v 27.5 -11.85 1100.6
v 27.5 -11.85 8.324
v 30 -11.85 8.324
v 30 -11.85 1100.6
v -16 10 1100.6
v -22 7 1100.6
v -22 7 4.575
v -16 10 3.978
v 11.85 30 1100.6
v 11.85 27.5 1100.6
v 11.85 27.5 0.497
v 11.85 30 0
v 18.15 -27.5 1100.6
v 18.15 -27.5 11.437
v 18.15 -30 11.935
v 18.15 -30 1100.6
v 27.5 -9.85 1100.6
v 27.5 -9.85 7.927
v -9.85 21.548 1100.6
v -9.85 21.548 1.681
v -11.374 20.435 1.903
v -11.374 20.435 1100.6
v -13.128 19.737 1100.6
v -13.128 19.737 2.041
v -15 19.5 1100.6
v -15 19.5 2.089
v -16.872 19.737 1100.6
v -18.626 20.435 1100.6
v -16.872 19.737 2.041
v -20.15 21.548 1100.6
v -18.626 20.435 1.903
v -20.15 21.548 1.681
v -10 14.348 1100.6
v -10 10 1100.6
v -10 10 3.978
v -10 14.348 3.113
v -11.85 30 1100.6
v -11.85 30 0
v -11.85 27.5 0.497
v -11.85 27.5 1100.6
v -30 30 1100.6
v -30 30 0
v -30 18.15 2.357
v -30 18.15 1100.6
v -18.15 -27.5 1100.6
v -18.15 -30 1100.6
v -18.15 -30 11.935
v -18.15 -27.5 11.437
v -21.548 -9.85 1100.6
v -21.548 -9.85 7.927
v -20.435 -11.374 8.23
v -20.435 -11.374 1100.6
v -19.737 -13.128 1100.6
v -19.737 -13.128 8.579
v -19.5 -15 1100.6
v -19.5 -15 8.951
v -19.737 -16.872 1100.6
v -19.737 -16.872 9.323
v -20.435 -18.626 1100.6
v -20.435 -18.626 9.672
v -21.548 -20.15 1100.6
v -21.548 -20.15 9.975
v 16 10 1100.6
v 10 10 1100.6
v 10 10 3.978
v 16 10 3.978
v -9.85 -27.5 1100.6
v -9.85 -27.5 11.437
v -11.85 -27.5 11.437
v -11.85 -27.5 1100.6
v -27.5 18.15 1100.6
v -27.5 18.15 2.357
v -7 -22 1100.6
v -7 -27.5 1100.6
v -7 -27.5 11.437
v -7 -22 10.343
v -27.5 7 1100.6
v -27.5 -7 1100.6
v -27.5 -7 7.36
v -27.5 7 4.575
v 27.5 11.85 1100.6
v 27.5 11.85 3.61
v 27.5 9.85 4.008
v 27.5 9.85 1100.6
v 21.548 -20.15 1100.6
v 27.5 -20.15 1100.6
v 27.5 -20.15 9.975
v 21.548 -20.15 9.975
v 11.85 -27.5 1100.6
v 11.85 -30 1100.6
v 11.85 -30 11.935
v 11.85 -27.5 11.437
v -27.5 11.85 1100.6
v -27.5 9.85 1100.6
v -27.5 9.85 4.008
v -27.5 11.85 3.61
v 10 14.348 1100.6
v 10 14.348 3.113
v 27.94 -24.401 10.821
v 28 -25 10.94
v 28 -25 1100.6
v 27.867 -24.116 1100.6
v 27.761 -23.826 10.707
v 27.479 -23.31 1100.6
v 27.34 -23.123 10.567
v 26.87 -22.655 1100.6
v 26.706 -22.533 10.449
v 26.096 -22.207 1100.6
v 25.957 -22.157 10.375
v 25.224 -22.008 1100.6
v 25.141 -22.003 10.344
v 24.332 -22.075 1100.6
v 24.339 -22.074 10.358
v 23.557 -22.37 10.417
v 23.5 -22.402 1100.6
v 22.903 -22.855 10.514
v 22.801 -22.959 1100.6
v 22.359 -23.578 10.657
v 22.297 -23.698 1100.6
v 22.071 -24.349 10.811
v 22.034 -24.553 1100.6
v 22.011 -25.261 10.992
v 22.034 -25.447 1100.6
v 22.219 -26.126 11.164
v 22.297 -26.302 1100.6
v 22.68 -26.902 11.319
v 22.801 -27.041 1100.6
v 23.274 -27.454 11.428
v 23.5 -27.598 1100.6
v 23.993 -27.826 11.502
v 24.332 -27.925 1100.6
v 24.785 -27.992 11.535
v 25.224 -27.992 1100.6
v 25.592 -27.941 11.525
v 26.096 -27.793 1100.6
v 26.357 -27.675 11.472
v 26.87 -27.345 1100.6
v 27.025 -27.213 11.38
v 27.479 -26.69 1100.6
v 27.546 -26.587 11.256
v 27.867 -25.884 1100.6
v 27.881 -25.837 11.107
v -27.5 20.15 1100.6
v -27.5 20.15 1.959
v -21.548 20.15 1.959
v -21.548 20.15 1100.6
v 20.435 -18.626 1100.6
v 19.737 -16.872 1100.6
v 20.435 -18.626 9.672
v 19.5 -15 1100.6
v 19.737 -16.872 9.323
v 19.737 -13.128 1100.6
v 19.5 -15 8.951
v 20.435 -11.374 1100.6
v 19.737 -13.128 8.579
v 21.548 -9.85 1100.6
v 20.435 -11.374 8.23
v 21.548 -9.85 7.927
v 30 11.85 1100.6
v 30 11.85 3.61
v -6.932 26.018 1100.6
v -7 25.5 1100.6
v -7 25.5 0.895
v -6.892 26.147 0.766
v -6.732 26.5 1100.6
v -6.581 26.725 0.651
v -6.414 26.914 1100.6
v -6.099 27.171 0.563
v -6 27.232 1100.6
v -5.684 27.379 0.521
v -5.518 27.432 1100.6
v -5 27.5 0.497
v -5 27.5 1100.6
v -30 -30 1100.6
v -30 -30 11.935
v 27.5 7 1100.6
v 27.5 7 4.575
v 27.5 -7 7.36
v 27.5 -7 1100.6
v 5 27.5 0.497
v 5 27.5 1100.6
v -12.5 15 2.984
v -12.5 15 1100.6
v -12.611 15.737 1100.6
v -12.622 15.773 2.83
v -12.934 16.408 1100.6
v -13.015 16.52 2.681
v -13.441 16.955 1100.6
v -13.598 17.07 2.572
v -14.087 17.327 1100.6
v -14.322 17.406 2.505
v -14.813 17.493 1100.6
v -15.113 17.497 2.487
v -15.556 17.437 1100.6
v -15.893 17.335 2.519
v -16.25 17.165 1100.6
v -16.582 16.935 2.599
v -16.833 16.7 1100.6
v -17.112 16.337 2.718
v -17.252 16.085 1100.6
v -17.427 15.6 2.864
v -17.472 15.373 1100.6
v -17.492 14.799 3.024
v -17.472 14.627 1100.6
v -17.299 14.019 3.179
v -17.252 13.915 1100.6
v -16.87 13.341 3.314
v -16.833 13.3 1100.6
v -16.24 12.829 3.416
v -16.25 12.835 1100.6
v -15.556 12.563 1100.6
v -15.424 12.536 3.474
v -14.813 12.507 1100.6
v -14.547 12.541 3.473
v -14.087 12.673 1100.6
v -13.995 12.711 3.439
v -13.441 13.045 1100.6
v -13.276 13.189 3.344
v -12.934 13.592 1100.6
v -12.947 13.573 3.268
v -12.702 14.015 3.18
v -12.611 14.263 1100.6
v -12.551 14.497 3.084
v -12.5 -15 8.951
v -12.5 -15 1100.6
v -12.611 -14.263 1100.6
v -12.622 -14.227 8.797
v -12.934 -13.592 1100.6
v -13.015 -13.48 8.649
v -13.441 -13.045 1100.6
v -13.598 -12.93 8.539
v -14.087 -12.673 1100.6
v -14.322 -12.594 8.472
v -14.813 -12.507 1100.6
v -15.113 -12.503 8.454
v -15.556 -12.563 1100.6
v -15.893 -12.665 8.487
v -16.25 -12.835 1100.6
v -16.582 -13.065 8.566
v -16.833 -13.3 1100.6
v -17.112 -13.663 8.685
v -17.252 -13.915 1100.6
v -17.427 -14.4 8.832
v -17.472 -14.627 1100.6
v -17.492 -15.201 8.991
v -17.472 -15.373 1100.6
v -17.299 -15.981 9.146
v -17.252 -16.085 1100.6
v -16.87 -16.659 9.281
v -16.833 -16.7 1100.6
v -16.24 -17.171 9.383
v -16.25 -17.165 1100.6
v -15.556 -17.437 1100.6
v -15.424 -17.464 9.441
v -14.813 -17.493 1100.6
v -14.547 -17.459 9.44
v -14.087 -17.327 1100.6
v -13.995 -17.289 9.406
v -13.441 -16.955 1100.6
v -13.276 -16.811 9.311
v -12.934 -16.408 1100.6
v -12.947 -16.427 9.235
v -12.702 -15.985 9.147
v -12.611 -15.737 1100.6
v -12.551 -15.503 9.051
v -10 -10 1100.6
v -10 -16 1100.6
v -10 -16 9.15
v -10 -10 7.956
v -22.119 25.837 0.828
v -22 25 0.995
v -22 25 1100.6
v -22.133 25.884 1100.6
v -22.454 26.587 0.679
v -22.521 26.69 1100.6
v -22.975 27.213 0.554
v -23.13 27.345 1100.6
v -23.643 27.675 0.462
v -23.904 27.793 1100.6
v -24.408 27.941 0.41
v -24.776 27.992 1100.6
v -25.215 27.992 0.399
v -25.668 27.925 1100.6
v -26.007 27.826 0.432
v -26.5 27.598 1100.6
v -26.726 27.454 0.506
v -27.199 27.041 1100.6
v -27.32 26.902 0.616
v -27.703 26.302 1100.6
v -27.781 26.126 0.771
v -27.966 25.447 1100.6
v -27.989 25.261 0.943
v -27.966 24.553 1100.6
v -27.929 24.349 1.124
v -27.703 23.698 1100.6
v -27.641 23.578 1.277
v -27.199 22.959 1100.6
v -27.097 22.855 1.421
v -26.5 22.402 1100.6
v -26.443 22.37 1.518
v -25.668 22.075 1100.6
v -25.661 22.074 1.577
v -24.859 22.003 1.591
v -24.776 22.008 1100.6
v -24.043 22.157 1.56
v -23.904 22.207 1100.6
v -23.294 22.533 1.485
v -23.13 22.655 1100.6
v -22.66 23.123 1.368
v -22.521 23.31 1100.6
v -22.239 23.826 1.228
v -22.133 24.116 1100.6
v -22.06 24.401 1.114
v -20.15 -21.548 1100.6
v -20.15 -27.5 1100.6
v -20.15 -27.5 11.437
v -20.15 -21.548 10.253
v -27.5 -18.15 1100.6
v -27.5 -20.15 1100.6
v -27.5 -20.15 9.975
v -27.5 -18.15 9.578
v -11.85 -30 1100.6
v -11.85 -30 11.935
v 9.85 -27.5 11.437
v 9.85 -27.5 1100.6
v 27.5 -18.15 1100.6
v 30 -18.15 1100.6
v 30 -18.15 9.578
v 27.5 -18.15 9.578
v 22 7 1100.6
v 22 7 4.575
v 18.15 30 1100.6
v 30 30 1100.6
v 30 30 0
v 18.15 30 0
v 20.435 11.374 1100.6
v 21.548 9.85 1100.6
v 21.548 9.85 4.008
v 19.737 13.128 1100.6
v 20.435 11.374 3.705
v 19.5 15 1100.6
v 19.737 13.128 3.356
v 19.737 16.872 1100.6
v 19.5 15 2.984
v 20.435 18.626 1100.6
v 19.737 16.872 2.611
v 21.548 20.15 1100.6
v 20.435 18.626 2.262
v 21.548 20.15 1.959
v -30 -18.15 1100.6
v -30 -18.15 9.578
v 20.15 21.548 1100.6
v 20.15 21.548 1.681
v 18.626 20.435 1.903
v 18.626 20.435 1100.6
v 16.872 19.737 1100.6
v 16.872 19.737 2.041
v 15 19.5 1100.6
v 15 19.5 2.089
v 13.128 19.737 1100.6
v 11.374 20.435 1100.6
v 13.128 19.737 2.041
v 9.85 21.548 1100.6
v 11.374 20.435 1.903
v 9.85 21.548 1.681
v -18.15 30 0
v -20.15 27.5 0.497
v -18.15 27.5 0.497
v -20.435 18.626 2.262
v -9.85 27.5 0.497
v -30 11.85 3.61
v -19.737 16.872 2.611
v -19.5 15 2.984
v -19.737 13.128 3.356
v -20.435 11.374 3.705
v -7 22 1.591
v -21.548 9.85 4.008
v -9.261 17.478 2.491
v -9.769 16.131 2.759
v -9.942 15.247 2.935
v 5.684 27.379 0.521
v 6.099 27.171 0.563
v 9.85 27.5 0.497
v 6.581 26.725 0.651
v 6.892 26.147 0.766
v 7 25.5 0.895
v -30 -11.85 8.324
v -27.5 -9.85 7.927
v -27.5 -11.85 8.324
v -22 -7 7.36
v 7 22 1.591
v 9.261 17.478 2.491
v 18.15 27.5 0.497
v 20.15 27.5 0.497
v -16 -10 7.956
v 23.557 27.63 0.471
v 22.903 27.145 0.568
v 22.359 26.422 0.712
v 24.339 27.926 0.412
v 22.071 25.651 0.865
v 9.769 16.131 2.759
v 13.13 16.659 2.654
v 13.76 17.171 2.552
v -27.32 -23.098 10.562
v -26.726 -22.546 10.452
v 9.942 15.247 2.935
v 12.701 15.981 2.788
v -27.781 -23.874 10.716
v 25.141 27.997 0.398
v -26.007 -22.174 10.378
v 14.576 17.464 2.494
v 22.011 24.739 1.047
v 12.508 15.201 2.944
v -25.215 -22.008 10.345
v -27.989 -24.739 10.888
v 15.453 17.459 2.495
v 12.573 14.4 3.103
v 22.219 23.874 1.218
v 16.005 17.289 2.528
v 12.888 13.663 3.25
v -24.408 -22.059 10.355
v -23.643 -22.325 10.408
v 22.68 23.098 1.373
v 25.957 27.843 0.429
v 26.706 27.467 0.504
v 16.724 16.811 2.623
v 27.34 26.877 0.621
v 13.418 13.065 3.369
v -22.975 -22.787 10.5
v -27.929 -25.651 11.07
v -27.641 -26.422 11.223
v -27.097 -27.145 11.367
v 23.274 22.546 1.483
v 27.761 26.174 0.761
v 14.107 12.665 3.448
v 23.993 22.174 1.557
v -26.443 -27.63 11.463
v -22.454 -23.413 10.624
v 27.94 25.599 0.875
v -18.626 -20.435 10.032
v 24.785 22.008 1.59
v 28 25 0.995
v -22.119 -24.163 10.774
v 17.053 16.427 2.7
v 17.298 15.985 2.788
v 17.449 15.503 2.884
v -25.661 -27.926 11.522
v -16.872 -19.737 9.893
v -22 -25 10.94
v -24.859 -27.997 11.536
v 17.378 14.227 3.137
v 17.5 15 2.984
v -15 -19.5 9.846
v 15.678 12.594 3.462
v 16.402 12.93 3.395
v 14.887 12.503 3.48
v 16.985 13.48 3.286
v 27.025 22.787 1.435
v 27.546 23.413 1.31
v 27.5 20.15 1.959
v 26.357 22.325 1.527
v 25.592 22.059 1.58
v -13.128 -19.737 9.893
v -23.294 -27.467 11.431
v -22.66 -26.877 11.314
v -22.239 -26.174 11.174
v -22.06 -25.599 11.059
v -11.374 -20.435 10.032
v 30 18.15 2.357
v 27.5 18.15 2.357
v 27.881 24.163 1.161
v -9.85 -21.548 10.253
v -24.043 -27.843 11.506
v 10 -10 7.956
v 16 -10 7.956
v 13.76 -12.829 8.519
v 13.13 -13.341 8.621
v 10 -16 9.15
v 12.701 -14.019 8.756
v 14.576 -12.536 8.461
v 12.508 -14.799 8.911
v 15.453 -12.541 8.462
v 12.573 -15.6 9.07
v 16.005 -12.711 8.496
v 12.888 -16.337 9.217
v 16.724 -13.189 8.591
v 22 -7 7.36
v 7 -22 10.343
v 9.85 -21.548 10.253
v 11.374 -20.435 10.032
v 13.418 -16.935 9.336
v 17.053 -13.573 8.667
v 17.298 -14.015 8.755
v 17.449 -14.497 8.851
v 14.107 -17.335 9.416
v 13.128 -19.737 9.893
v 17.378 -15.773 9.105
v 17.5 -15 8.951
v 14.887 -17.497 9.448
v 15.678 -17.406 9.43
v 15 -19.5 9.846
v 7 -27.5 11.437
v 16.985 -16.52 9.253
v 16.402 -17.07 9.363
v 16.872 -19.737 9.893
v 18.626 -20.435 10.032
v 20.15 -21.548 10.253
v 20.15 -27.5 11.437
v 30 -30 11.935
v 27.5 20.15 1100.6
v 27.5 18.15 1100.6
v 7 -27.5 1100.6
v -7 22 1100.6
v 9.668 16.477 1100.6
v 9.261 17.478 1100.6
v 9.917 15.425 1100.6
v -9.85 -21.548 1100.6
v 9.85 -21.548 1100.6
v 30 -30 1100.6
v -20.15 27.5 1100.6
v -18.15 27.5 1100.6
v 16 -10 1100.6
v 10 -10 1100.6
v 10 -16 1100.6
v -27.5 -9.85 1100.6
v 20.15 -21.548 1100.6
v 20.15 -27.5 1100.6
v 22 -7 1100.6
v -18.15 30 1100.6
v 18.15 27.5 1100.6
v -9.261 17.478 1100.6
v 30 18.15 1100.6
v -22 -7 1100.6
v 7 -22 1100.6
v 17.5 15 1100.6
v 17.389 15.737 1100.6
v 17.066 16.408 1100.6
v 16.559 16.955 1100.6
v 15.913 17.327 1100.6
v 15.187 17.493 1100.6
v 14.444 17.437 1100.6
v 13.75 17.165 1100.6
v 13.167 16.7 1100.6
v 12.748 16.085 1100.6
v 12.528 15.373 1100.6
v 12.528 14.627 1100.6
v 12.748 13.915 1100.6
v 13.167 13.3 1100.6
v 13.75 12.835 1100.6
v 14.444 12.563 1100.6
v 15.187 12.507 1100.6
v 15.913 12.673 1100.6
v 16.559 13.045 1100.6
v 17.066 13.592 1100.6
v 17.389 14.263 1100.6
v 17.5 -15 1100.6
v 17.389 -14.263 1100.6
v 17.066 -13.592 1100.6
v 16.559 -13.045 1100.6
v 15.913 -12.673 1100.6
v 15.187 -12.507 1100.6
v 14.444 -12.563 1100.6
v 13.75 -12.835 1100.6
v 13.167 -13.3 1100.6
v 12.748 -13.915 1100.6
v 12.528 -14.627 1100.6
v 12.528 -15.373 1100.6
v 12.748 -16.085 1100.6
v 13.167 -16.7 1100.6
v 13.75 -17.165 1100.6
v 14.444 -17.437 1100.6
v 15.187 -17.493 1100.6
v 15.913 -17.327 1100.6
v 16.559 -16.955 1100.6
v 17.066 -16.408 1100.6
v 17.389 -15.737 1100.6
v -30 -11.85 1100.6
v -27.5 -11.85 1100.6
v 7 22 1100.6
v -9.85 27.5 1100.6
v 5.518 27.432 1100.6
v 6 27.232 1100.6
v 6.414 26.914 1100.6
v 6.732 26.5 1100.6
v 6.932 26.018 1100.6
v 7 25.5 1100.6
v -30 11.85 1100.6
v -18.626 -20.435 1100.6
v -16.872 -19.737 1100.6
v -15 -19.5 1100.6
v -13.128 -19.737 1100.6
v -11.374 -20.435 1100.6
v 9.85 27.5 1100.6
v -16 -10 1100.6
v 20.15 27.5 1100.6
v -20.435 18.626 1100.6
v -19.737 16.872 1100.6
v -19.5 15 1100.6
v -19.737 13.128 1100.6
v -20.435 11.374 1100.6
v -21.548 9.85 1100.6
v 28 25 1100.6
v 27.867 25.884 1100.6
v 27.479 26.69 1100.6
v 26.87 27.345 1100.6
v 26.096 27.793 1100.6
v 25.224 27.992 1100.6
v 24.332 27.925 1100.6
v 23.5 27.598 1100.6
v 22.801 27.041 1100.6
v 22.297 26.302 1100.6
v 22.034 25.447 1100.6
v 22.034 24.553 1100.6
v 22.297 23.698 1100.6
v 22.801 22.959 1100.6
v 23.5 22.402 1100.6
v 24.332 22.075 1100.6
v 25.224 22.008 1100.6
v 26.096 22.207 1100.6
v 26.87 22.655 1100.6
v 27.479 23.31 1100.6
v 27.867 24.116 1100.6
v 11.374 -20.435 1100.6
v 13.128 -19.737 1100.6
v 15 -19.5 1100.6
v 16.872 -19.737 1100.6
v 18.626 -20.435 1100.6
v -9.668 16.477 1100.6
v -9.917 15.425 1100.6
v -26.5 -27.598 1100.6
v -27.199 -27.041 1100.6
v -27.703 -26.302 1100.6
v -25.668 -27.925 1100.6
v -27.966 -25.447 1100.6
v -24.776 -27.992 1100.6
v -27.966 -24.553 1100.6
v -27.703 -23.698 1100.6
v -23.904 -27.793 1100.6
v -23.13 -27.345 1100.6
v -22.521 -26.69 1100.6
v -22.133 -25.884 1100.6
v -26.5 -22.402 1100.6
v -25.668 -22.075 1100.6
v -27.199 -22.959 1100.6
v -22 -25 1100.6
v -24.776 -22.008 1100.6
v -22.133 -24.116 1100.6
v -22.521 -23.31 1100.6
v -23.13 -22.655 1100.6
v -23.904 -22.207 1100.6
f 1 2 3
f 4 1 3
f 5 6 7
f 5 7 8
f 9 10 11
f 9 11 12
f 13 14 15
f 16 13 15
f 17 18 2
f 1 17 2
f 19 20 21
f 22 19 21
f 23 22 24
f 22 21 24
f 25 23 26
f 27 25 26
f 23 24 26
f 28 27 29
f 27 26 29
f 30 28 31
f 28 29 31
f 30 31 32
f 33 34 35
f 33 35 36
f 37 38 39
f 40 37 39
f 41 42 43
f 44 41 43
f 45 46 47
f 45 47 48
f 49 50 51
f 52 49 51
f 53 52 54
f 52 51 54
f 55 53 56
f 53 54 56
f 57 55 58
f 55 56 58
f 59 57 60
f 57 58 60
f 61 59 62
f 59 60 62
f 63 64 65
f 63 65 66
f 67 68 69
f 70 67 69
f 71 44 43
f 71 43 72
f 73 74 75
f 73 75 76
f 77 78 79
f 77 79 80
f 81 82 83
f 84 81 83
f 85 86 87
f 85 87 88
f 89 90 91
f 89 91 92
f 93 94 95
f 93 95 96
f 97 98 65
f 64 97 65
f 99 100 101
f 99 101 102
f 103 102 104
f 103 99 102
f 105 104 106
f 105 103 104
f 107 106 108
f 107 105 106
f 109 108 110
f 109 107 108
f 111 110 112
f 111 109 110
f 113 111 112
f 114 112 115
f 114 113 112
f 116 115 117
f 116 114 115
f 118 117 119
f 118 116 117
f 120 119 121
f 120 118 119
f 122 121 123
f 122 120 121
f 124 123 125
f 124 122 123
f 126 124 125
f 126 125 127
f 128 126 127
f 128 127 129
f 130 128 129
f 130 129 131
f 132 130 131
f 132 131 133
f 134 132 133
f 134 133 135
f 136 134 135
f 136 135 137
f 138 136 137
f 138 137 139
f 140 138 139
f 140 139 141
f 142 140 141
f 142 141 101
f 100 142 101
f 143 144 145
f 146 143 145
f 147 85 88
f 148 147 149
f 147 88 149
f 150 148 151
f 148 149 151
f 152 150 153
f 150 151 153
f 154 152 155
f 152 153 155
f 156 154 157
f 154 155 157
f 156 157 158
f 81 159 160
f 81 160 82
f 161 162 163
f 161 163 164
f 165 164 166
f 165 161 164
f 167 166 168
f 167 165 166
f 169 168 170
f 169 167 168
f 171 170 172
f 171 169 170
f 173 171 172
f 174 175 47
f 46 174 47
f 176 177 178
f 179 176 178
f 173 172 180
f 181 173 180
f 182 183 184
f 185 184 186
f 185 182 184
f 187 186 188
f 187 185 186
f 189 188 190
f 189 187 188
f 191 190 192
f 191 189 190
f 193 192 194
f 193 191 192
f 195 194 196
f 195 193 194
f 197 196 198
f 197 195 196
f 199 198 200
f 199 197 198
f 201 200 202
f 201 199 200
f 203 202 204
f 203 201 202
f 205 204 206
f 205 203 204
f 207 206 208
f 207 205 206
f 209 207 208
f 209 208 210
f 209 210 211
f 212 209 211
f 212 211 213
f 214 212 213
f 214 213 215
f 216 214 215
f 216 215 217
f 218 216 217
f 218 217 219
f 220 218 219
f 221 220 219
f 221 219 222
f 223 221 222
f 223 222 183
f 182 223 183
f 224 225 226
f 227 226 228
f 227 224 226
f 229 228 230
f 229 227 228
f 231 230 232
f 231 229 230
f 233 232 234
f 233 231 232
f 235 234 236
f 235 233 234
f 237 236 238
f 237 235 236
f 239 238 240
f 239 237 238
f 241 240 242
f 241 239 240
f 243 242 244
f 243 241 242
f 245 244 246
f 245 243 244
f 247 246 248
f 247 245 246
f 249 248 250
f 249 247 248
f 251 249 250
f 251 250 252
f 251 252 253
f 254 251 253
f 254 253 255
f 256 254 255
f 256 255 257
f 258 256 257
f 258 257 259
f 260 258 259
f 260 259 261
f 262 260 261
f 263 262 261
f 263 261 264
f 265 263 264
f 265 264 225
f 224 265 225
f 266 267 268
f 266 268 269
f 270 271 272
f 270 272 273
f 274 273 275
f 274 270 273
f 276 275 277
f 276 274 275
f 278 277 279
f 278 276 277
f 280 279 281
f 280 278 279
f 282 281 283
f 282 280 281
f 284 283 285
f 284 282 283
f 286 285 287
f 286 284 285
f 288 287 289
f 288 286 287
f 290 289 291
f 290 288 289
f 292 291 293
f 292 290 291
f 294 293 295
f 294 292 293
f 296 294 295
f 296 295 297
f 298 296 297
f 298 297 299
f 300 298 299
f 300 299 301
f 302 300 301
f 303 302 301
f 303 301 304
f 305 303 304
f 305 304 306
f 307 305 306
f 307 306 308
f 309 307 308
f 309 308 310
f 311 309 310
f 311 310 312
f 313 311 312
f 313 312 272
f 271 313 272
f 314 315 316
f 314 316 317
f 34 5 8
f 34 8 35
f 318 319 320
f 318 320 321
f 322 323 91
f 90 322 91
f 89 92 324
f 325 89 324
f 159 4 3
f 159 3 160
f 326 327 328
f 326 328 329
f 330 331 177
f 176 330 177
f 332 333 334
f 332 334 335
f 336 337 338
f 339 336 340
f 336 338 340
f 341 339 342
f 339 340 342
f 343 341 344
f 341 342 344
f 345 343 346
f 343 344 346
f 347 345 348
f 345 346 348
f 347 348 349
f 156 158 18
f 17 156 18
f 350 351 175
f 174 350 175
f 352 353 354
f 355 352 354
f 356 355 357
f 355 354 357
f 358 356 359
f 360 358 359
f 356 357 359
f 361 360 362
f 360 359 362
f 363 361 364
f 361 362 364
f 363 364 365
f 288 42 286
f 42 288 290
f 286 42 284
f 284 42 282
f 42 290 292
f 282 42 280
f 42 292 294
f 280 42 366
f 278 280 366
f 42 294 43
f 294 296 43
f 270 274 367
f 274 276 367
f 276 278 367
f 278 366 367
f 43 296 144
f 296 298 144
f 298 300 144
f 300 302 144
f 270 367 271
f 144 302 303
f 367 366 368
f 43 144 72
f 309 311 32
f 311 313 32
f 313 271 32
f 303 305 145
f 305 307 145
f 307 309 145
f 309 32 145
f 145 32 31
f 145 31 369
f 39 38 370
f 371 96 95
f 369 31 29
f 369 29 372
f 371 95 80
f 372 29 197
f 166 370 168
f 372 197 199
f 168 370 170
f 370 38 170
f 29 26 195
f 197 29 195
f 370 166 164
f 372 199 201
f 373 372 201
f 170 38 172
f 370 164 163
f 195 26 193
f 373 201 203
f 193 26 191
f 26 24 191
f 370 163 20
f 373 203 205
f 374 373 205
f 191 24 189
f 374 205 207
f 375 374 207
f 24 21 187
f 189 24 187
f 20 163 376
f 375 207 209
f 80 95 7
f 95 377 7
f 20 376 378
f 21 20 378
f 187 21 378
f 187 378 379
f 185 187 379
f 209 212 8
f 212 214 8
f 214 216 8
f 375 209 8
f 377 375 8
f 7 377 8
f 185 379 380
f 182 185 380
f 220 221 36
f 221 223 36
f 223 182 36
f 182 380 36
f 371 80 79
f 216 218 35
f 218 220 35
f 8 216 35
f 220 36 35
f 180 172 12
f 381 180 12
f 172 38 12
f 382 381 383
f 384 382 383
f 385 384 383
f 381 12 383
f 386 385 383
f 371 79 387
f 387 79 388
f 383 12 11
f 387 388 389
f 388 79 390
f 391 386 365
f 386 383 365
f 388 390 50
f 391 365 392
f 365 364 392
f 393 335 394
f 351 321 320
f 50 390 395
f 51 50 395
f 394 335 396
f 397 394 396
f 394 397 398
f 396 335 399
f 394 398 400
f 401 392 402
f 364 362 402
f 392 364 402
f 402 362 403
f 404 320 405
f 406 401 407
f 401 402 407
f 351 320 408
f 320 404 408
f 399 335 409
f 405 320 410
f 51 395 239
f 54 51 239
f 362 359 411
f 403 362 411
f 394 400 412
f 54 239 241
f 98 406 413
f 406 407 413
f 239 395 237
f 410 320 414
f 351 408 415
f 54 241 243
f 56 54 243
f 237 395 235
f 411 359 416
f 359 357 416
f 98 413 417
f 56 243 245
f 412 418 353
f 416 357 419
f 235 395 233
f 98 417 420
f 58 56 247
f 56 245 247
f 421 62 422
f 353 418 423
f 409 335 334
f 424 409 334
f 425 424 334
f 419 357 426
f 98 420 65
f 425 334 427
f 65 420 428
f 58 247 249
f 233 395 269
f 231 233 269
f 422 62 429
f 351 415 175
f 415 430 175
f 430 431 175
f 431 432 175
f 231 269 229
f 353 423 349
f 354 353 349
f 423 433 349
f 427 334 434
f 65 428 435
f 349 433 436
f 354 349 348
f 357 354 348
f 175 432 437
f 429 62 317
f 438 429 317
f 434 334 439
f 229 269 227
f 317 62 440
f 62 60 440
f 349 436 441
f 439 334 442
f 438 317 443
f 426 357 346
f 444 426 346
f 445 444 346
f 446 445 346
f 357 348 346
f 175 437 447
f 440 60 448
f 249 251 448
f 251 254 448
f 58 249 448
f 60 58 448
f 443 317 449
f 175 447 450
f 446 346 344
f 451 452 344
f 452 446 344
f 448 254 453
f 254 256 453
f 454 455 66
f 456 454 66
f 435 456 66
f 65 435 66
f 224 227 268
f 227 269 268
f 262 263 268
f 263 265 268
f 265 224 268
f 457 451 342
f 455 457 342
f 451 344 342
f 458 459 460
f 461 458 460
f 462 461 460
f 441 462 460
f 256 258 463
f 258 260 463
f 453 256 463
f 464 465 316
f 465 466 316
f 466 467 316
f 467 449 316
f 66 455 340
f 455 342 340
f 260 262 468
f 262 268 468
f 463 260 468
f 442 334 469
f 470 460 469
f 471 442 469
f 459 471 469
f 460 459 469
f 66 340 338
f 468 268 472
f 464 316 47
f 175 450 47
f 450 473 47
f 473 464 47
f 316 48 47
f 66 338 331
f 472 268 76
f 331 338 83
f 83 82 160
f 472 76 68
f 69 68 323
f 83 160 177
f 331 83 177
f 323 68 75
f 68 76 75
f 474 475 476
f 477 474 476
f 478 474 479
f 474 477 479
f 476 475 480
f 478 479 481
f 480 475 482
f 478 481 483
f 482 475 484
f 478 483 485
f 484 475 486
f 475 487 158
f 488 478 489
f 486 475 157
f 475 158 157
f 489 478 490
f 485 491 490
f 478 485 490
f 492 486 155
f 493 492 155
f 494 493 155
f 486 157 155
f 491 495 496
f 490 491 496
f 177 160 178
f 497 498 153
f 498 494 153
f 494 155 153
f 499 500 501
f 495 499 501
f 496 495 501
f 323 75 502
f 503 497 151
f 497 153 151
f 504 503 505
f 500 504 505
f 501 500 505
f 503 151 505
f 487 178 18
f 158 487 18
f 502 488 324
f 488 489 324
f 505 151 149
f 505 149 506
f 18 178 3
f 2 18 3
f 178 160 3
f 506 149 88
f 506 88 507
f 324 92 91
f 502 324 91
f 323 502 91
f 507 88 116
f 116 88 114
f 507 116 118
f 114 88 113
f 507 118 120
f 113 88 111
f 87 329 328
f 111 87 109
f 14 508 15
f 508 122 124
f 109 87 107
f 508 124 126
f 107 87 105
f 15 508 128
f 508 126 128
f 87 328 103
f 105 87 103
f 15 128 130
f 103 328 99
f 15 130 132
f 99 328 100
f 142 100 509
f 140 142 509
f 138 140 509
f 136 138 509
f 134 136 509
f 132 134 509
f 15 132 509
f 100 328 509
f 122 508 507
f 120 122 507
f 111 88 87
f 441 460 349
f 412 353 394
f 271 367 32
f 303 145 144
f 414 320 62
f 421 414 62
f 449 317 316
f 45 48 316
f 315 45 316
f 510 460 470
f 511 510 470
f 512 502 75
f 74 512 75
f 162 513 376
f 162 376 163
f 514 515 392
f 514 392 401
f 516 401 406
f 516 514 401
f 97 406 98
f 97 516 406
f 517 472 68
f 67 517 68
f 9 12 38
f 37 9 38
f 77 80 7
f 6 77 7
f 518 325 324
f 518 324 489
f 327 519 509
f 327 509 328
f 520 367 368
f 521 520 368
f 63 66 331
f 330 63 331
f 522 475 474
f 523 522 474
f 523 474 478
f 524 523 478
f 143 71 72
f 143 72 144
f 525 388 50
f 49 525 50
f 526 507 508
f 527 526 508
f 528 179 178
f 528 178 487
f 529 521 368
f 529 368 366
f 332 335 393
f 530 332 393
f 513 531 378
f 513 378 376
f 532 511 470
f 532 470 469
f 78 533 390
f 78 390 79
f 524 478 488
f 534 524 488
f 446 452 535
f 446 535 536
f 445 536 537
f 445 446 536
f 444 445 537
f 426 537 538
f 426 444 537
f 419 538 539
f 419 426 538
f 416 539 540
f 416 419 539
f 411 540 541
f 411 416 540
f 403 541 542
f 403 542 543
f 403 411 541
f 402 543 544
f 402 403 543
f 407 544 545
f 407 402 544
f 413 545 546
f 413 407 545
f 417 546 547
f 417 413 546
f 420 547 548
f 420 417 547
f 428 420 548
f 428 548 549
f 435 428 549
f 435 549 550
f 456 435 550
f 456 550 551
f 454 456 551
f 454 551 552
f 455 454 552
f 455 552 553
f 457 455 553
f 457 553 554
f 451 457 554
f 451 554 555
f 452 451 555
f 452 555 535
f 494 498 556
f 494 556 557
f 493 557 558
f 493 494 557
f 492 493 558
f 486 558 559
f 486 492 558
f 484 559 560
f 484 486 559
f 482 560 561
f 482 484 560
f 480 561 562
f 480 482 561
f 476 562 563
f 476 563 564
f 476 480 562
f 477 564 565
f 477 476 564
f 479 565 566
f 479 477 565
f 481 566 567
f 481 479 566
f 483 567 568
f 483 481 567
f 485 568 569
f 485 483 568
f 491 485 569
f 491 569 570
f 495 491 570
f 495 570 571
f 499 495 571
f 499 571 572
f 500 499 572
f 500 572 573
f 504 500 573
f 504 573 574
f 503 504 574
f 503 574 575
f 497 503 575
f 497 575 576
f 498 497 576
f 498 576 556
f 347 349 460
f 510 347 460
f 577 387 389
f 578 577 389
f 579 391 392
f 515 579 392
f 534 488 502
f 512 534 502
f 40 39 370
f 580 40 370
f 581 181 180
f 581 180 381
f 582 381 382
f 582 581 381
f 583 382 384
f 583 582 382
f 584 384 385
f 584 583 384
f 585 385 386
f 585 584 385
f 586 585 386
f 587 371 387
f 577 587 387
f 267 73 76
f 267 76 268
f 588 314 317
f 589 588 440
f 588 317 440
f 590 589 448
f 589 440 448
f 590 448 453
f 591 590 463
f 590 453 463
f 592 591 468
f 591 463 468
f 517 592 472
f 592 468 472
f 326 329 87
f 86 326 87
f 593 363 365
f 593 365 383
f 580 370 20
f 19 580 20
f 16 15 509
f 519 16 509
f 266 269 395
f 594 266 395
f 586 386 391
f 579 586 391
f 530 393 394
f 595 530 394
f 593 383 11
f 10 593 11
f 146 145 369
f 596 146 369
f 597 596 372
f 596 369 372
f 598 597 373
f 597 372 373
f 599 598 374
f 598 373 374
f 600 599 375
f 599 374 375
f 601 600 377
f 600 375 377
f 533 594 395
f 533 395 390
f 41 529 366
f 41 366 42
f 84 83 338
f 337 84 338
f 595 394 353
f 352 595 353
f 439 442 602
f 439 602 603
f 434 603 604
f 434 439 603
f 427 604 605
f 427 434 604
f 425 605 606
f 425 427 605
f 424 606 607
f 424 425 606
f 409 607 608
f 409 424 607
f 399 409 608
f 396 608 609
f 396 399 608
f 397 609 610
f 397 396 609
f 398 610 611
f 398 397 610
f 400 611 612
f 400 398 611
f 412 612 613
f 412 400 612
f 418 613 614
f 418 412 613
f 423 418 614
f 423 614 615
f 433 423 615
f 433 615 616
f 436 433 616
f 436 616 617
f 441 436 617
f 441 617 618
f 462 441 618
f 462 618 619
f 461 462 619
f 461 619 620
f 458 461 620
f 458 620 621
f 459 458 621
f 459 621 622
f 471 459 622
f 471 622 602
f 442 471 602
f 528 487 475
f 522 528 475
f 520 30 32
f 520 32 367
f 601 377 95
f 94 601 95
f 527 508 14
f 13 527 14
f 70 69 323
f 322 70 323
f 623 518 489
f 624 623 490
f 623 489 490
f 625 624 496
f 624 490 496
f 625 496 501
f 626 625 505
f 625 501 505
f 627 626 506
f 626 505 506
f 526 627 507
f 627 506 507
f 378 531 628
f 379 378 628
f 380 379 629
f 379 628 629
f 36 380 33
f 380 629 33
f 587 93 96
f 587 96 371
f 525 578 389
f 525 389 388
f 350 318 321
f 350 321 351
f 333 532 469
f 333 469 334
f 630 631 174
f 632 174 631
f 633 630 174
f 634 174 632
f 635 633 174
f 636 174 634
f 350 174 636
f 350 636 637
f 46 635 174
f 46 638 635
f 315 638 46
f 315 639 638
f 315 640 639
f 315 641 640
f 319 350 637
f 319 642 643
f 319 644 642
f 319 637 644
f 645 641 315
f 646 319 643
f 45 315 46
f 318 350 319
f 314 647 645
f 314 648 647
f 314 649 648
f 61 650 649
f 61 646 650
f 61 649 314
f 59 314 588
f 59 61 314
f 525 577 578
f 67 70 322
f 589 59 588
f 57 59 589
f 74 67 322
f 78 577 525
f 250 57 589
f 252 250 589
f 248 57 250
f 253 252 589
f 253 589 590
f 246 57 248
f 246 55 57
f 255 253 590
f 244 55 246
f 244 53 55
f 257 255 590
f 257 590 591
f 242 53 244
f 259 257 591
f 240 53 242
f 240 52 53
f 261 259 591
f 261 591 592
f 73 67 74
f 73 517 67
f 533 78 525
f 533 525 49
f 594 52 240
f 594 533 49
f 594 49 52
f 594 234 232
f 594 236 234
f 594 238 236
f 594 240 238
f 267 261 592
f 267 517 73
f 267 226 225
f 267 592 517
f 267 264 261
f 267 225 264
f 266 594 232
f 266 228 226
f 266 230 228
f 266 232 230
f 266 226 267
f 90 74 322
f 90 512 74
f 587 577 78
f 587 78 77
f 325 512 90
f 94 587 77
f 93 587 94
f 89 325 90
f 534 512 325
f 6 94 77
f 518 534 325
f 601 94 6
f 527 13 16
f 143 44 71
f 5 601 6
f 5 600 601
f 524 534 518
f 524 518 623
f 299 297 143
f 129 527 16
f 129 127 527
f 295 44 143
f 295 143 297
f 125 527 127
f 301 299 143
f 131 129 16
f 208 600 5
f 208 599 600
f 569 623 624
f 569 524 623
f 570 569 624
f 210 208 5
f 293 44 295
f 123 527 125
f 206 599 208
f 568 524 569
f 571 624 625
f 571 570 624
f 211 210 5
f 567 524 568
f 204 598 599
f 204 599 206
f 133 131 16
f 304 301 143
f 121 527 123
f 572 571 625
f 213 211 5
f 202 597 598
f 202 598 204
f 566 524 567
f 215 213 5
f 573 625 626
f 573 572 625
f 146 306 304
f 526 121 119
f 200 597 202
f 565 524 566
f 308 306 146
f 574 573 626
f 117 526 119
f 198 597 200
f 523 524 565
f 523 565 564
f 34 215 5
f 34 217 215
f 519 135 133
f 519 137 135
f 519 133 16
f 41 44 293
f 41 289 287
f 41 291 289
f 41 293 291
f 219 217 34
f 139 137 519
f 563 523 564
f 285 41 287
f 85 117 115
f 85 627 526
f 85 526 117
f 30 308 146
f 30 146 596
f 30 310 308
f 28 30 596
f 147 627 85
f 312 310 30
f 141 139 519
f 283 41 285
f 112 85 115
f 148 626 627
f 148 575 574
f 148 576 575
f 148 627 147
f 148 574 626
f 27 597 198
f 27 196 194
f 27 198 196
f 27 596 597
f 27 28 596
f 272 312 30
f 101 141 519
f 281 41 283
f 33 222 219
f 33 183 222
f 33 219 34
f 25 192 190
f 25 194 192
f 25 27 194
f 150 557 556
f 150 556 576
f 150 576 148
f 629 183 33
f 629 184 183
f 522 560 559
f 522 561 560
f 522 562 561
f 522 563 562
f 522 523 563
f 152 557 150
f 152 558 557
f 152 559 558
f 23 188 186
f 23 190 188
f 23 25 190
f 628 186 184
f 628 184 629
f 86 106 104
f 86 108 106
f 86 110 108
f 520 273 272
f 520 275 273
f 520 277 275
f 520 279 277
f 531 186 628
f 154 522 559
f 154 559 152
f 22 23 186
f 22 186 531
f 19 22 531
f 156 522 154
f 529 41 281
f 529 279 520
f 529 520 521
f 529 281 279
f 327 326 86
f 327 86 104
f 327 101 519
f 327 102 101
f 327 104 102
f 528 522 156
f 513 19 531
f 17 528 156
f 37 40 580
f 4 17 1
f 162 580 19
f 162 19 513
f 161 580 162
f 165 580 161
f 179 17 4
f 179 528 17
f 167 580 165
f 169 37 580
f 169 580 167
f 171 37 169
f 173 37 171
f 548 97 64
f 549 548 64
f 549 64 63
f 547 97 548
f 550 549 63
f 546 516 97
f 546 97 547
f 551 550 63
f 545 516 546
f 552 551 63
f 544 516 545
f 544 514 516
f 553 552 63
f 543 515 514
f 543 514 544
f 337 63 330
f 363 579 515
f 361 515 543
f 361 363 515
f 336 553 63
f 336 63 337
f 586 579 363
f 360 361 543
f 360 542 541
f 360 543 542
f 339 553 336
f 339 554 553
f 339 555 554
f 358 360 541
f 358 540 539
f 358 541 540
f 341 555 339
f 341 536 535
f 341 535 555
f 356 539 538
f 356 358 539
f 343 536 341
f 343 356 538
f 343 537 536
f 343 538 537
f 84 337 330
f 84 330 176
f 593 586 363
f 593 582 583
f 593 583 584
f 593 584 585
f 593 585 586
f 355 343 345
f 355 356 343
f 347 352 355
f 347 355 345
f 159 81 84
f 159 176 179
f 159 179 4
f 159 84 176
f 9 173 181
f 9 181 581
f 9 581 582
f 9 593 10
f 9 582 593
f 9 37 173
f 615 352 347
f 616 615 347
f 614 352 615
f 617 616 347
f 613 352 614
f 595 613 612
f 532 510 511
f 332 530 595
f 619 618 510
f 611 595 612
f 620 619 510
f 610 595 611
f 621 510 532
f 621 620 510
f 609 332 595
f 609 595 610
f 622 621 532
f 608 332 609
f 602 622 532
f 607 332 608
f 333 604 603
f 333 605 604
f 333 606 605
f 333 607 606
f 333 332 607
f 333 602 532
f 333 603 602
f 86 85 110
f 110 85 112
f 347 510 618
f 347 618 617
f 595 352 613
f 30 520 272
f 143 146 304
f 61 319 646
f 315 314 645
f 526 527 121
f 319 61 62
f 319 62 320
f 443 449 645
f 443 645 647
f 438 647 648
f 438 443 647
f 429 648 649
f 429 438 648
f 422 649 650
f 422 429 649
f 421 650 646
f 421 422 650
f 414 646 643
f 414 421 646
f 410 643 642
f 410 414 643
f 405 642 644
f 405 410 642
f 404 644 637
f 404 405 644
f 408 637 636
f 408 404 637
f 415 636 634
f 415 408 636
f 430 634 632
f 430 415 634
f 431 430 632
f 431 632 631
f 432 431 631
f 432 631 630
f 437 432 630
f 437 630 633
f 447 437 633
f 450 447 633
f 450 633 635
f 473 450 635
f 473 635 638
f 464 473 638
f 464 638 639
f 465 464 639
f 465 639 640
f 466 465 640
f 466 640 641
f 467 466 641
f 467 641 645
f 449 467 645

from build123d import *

# Parameters (mm, degrees)
F0_R          = 3
F0_R_2        = 2.5
F1_DEPTH      = 1100.6
F2_R          = 2
F3_R          = 7
F5_DEPTH      = 30
F5_DEPTH_BACK = 30


# Not quite as in the source:
# - a feature names something its author has since deleted; it is built from what else it names


with BuildPart() as f1:
    # F0 (on Top) → F1 (new body)
    with BuildSketch(Plane.XY):
        with BuildLine():
            Line((18.15, -30), (30, -30))
            Line((30, -30), (30, -18.15))
            Line((30, -18.15), (27.5, -18.15))
            Line((27.5, -18.15), (27.5, -20.15))
            Line((27.5, -20.15), (21.5477069044, -20.15))
            ThreePointArc((21.5477069044, -20.15), (19.5, -15), (21.5477069044, -9.85))
            Line((21.5477069044, -9.85), (27.5, -9.85))
            Line((27.5, -9.85), (27.5, -11.85))
            Line((27.5, -11.85), (30, -11.85))
            Line((30, -11.85), (30, 11.85))
            Line((30, 11.85), (27.5, 11.85))
            Line((27.5, 11.85), (27.5, 9.85))
            Line((27.5, 9.85), (21.5477069044, 9.85))
            ThreePointArc((21.5477069044, 9.85), (19.5, 15), (21.5477069044, 20.15))
            Line((21.5477069044, 20.15), (27.5, 20.15))
            Line((27.5, 20.15), (27.5, 18.15))
            Line((27.5, 18.15), (30, 18.15))
            Line((30, 18.15), (30, 30))
            Line((30, 30), (18.15, 30))
            Line((18.15, 30), (18.15, 27.5))
            Line((18.15, 27.5), (20.15, 27.5))
            Line((20.15, 27.5), (20.15, 21.5477069044))
            ThreePointArc((20.15, 21.5477069044), (15, 19.5), (9.85, 21.5477069044))
            Line((9.85, 21.5477069044), (9.85, 27.5))
            Line((9.85, 27.5), (11.85, 27.5))
            Line((11.85, 27.5), (11.85, 30))
            Line((11.85, 30), (-11.85, 30))
            Line((-11.85, 30), (-11.85, 27.5))
            Line((-11.85, 27.5), (-9.85, 27.5))
            Line((-9.85, 27.5), (-9.85, 21.5477069044))
            ThreePointArc((-9.85, 21.5477069044), (-15, 19.5), (-20.15, 21.5477069044))
            Line((-20.15, 21.5477069044), (-20.15, 27.5))
            Line((-20.15, 27.5), (-18.15, 27.5))
            Line((-18.15, 27.5), (-18.15, 30))
            Line((-18.15, 30), (-30, 30))
            Line((-30, 30), (-30, 18.15))
            Line((-30, 18.15), (-27.5, 18.15))
            Line((-27.5, 18.15), (-27.5, 20.15))
            Line((-27.5, 20.15), (-21.5477069044, 20.15))
            ThreePointArc((-21.5477069044, 20.15), (-19.5, 15), (-21.5477069044, 9.85))
            Line((-21.5477069044, 9.85), (-27.5, 9.85))
            Line((-27.5, 9.85), (-27.5, 11.85))
            Line((-27.5, 11.85), (-30, 11.85))
            Line((-30, 11.85), (-30, -11.85))
            Line((-30, -11.85), (-27.5, -11.85))
            Line((-27.5, -11.85), (-27.5, -9.85))
            Line((-27.5, -9.85), (-21.5477069044, -9.85))
            ThreePointArc((-21.5477069044, -9.85), (-19.5, -15), (-21.5477069044, -20.15))
            Line((-21.5477069044, -20.15), (-27.5, -20.15))
            Line((-27.5, -20.15), (-27.5, -18.15))
            Line((-27.5, -18.15), (-30, -18.15))
            Line((-30, -18.15), (-30, -30))
            Line((-30, -30), (-18.15, -30))
            Line((-18.15, -30), (-18.15, -27.5))
            Line((-18.15, -27.5), (-20.15, -27.5))
            Line((-20.15, -27.5), (-20.15, -21.5477069044))
            ThreePointArc((-20.15, -21.5477069044), (-15, -19.5), (-9.85, -21.5477069044))
            Line((-9.85, -21.5477069044), (-9.85, -27.5))
            Line((-9.85, -27.5), (-11.85, -27.5))
            Line((-11.85, -27.5), (-11.85, -30))
            Line((-11.85, -30), (11.85, -30))
            Line((11.85, -30), (11.85, -27.5))
            Line((11.85, -27.5), (9.85, -27.5))
            Line((9.85, -27.5), (9.85, -21.5477069044))
            ThreePointArc((9.85, -21.5477069044), (15, -19.5), (20.15, -21.5477069044))
            Line((20.15, -21.5477069044), (20.15, -27.5))
            Line((20.15, -27.5), (18.15, -27.5))
            Line((18.15, -27.5), (18.15, -30))
        make_face()
        with Locations((-25, -25)):
            Circle(F0_R, mode=Mode.SUBTRACT)
        with Locations((-15, -15)):
            Circle(F0_R_2, mode=Mode.SUBTRACT)
        with Locations((25, -25)):
            Circle(F0_R, mode=Mode.SUBTRACT)
        with Locations((15, -15)):
            Circle(F0_R_2, mode=Mode.SUBTRACT)
        with Locations((-25, 25)):
            Circle(F0_R, mode=Mode.SUBTRACT)
        with Locations((-15, 15)):
            Circle(F0_R_2, mode=Mode.SUBTRACT)
        Polygon((-7, 22), (-7, 27.5), (0, 27.5), (7, 27.5), (7, 22), (10, 16), (10, 10), (16, 10), (22, 7), (27.5, 7), (27.5, 0), (27.5, -7), (22, -7), (16, -10), (10, -10), (10, -16), (7, -22), (7, -27.5), (0, -27.5), (-7, -27.5), (-7, -22), (-10, -16), (-10, -10), (-16, -10), (-22, -7), (-27.5, -7), (-27.5, 0), (-27.5, 7), (-22, 7), (-16, 10), (-10, 10), (-10, 16), align=None, mode=Mode.SUBTRACT)
        with Locations((15, 15)):
            Circle(F0_R_2, mode=Mode.SUBTRACT)
        with Locations((25, 25)):
            Circle(F0_R, mode=Mode.SUBTRACT)
    extrude(amount=F1_DEPTH)

    # F2
    f2_edges = [f1.edges().sort_by_distance(p)[0] for p in [
        (-7, 27.5, 550.3),
        (7, 27.5, 550.3),
    ]]
    fillet(f2_edges, radius=F2_R)

    # F3
    f3_edges = [f1.edges().sort_by_distance(p)[0] for p in [
        (-10, 16, 550.3),
        (10, 16, 550.3),
    ]]
    fillet(f3_edges, radius=F3_R)

    # F4 (on Right) → F5 (cut, two sides)
    with BuildSketch(Plane.YZ) as f5_sk:
        Polygon((-164.2855995683, 38.6458085579), (-188.5911429791, -83.5464097089), (5.6944565892, -122.1922182668), (30, 0), align=None)
    extrude(amount=F5_DEPTH, mode=Mode.SUBTRACT)
    extrude(f5_sk.sketch, amount=-F5_DEPTH_BACK, mode=Mode.SUBTRACT)


solid = f1.part
